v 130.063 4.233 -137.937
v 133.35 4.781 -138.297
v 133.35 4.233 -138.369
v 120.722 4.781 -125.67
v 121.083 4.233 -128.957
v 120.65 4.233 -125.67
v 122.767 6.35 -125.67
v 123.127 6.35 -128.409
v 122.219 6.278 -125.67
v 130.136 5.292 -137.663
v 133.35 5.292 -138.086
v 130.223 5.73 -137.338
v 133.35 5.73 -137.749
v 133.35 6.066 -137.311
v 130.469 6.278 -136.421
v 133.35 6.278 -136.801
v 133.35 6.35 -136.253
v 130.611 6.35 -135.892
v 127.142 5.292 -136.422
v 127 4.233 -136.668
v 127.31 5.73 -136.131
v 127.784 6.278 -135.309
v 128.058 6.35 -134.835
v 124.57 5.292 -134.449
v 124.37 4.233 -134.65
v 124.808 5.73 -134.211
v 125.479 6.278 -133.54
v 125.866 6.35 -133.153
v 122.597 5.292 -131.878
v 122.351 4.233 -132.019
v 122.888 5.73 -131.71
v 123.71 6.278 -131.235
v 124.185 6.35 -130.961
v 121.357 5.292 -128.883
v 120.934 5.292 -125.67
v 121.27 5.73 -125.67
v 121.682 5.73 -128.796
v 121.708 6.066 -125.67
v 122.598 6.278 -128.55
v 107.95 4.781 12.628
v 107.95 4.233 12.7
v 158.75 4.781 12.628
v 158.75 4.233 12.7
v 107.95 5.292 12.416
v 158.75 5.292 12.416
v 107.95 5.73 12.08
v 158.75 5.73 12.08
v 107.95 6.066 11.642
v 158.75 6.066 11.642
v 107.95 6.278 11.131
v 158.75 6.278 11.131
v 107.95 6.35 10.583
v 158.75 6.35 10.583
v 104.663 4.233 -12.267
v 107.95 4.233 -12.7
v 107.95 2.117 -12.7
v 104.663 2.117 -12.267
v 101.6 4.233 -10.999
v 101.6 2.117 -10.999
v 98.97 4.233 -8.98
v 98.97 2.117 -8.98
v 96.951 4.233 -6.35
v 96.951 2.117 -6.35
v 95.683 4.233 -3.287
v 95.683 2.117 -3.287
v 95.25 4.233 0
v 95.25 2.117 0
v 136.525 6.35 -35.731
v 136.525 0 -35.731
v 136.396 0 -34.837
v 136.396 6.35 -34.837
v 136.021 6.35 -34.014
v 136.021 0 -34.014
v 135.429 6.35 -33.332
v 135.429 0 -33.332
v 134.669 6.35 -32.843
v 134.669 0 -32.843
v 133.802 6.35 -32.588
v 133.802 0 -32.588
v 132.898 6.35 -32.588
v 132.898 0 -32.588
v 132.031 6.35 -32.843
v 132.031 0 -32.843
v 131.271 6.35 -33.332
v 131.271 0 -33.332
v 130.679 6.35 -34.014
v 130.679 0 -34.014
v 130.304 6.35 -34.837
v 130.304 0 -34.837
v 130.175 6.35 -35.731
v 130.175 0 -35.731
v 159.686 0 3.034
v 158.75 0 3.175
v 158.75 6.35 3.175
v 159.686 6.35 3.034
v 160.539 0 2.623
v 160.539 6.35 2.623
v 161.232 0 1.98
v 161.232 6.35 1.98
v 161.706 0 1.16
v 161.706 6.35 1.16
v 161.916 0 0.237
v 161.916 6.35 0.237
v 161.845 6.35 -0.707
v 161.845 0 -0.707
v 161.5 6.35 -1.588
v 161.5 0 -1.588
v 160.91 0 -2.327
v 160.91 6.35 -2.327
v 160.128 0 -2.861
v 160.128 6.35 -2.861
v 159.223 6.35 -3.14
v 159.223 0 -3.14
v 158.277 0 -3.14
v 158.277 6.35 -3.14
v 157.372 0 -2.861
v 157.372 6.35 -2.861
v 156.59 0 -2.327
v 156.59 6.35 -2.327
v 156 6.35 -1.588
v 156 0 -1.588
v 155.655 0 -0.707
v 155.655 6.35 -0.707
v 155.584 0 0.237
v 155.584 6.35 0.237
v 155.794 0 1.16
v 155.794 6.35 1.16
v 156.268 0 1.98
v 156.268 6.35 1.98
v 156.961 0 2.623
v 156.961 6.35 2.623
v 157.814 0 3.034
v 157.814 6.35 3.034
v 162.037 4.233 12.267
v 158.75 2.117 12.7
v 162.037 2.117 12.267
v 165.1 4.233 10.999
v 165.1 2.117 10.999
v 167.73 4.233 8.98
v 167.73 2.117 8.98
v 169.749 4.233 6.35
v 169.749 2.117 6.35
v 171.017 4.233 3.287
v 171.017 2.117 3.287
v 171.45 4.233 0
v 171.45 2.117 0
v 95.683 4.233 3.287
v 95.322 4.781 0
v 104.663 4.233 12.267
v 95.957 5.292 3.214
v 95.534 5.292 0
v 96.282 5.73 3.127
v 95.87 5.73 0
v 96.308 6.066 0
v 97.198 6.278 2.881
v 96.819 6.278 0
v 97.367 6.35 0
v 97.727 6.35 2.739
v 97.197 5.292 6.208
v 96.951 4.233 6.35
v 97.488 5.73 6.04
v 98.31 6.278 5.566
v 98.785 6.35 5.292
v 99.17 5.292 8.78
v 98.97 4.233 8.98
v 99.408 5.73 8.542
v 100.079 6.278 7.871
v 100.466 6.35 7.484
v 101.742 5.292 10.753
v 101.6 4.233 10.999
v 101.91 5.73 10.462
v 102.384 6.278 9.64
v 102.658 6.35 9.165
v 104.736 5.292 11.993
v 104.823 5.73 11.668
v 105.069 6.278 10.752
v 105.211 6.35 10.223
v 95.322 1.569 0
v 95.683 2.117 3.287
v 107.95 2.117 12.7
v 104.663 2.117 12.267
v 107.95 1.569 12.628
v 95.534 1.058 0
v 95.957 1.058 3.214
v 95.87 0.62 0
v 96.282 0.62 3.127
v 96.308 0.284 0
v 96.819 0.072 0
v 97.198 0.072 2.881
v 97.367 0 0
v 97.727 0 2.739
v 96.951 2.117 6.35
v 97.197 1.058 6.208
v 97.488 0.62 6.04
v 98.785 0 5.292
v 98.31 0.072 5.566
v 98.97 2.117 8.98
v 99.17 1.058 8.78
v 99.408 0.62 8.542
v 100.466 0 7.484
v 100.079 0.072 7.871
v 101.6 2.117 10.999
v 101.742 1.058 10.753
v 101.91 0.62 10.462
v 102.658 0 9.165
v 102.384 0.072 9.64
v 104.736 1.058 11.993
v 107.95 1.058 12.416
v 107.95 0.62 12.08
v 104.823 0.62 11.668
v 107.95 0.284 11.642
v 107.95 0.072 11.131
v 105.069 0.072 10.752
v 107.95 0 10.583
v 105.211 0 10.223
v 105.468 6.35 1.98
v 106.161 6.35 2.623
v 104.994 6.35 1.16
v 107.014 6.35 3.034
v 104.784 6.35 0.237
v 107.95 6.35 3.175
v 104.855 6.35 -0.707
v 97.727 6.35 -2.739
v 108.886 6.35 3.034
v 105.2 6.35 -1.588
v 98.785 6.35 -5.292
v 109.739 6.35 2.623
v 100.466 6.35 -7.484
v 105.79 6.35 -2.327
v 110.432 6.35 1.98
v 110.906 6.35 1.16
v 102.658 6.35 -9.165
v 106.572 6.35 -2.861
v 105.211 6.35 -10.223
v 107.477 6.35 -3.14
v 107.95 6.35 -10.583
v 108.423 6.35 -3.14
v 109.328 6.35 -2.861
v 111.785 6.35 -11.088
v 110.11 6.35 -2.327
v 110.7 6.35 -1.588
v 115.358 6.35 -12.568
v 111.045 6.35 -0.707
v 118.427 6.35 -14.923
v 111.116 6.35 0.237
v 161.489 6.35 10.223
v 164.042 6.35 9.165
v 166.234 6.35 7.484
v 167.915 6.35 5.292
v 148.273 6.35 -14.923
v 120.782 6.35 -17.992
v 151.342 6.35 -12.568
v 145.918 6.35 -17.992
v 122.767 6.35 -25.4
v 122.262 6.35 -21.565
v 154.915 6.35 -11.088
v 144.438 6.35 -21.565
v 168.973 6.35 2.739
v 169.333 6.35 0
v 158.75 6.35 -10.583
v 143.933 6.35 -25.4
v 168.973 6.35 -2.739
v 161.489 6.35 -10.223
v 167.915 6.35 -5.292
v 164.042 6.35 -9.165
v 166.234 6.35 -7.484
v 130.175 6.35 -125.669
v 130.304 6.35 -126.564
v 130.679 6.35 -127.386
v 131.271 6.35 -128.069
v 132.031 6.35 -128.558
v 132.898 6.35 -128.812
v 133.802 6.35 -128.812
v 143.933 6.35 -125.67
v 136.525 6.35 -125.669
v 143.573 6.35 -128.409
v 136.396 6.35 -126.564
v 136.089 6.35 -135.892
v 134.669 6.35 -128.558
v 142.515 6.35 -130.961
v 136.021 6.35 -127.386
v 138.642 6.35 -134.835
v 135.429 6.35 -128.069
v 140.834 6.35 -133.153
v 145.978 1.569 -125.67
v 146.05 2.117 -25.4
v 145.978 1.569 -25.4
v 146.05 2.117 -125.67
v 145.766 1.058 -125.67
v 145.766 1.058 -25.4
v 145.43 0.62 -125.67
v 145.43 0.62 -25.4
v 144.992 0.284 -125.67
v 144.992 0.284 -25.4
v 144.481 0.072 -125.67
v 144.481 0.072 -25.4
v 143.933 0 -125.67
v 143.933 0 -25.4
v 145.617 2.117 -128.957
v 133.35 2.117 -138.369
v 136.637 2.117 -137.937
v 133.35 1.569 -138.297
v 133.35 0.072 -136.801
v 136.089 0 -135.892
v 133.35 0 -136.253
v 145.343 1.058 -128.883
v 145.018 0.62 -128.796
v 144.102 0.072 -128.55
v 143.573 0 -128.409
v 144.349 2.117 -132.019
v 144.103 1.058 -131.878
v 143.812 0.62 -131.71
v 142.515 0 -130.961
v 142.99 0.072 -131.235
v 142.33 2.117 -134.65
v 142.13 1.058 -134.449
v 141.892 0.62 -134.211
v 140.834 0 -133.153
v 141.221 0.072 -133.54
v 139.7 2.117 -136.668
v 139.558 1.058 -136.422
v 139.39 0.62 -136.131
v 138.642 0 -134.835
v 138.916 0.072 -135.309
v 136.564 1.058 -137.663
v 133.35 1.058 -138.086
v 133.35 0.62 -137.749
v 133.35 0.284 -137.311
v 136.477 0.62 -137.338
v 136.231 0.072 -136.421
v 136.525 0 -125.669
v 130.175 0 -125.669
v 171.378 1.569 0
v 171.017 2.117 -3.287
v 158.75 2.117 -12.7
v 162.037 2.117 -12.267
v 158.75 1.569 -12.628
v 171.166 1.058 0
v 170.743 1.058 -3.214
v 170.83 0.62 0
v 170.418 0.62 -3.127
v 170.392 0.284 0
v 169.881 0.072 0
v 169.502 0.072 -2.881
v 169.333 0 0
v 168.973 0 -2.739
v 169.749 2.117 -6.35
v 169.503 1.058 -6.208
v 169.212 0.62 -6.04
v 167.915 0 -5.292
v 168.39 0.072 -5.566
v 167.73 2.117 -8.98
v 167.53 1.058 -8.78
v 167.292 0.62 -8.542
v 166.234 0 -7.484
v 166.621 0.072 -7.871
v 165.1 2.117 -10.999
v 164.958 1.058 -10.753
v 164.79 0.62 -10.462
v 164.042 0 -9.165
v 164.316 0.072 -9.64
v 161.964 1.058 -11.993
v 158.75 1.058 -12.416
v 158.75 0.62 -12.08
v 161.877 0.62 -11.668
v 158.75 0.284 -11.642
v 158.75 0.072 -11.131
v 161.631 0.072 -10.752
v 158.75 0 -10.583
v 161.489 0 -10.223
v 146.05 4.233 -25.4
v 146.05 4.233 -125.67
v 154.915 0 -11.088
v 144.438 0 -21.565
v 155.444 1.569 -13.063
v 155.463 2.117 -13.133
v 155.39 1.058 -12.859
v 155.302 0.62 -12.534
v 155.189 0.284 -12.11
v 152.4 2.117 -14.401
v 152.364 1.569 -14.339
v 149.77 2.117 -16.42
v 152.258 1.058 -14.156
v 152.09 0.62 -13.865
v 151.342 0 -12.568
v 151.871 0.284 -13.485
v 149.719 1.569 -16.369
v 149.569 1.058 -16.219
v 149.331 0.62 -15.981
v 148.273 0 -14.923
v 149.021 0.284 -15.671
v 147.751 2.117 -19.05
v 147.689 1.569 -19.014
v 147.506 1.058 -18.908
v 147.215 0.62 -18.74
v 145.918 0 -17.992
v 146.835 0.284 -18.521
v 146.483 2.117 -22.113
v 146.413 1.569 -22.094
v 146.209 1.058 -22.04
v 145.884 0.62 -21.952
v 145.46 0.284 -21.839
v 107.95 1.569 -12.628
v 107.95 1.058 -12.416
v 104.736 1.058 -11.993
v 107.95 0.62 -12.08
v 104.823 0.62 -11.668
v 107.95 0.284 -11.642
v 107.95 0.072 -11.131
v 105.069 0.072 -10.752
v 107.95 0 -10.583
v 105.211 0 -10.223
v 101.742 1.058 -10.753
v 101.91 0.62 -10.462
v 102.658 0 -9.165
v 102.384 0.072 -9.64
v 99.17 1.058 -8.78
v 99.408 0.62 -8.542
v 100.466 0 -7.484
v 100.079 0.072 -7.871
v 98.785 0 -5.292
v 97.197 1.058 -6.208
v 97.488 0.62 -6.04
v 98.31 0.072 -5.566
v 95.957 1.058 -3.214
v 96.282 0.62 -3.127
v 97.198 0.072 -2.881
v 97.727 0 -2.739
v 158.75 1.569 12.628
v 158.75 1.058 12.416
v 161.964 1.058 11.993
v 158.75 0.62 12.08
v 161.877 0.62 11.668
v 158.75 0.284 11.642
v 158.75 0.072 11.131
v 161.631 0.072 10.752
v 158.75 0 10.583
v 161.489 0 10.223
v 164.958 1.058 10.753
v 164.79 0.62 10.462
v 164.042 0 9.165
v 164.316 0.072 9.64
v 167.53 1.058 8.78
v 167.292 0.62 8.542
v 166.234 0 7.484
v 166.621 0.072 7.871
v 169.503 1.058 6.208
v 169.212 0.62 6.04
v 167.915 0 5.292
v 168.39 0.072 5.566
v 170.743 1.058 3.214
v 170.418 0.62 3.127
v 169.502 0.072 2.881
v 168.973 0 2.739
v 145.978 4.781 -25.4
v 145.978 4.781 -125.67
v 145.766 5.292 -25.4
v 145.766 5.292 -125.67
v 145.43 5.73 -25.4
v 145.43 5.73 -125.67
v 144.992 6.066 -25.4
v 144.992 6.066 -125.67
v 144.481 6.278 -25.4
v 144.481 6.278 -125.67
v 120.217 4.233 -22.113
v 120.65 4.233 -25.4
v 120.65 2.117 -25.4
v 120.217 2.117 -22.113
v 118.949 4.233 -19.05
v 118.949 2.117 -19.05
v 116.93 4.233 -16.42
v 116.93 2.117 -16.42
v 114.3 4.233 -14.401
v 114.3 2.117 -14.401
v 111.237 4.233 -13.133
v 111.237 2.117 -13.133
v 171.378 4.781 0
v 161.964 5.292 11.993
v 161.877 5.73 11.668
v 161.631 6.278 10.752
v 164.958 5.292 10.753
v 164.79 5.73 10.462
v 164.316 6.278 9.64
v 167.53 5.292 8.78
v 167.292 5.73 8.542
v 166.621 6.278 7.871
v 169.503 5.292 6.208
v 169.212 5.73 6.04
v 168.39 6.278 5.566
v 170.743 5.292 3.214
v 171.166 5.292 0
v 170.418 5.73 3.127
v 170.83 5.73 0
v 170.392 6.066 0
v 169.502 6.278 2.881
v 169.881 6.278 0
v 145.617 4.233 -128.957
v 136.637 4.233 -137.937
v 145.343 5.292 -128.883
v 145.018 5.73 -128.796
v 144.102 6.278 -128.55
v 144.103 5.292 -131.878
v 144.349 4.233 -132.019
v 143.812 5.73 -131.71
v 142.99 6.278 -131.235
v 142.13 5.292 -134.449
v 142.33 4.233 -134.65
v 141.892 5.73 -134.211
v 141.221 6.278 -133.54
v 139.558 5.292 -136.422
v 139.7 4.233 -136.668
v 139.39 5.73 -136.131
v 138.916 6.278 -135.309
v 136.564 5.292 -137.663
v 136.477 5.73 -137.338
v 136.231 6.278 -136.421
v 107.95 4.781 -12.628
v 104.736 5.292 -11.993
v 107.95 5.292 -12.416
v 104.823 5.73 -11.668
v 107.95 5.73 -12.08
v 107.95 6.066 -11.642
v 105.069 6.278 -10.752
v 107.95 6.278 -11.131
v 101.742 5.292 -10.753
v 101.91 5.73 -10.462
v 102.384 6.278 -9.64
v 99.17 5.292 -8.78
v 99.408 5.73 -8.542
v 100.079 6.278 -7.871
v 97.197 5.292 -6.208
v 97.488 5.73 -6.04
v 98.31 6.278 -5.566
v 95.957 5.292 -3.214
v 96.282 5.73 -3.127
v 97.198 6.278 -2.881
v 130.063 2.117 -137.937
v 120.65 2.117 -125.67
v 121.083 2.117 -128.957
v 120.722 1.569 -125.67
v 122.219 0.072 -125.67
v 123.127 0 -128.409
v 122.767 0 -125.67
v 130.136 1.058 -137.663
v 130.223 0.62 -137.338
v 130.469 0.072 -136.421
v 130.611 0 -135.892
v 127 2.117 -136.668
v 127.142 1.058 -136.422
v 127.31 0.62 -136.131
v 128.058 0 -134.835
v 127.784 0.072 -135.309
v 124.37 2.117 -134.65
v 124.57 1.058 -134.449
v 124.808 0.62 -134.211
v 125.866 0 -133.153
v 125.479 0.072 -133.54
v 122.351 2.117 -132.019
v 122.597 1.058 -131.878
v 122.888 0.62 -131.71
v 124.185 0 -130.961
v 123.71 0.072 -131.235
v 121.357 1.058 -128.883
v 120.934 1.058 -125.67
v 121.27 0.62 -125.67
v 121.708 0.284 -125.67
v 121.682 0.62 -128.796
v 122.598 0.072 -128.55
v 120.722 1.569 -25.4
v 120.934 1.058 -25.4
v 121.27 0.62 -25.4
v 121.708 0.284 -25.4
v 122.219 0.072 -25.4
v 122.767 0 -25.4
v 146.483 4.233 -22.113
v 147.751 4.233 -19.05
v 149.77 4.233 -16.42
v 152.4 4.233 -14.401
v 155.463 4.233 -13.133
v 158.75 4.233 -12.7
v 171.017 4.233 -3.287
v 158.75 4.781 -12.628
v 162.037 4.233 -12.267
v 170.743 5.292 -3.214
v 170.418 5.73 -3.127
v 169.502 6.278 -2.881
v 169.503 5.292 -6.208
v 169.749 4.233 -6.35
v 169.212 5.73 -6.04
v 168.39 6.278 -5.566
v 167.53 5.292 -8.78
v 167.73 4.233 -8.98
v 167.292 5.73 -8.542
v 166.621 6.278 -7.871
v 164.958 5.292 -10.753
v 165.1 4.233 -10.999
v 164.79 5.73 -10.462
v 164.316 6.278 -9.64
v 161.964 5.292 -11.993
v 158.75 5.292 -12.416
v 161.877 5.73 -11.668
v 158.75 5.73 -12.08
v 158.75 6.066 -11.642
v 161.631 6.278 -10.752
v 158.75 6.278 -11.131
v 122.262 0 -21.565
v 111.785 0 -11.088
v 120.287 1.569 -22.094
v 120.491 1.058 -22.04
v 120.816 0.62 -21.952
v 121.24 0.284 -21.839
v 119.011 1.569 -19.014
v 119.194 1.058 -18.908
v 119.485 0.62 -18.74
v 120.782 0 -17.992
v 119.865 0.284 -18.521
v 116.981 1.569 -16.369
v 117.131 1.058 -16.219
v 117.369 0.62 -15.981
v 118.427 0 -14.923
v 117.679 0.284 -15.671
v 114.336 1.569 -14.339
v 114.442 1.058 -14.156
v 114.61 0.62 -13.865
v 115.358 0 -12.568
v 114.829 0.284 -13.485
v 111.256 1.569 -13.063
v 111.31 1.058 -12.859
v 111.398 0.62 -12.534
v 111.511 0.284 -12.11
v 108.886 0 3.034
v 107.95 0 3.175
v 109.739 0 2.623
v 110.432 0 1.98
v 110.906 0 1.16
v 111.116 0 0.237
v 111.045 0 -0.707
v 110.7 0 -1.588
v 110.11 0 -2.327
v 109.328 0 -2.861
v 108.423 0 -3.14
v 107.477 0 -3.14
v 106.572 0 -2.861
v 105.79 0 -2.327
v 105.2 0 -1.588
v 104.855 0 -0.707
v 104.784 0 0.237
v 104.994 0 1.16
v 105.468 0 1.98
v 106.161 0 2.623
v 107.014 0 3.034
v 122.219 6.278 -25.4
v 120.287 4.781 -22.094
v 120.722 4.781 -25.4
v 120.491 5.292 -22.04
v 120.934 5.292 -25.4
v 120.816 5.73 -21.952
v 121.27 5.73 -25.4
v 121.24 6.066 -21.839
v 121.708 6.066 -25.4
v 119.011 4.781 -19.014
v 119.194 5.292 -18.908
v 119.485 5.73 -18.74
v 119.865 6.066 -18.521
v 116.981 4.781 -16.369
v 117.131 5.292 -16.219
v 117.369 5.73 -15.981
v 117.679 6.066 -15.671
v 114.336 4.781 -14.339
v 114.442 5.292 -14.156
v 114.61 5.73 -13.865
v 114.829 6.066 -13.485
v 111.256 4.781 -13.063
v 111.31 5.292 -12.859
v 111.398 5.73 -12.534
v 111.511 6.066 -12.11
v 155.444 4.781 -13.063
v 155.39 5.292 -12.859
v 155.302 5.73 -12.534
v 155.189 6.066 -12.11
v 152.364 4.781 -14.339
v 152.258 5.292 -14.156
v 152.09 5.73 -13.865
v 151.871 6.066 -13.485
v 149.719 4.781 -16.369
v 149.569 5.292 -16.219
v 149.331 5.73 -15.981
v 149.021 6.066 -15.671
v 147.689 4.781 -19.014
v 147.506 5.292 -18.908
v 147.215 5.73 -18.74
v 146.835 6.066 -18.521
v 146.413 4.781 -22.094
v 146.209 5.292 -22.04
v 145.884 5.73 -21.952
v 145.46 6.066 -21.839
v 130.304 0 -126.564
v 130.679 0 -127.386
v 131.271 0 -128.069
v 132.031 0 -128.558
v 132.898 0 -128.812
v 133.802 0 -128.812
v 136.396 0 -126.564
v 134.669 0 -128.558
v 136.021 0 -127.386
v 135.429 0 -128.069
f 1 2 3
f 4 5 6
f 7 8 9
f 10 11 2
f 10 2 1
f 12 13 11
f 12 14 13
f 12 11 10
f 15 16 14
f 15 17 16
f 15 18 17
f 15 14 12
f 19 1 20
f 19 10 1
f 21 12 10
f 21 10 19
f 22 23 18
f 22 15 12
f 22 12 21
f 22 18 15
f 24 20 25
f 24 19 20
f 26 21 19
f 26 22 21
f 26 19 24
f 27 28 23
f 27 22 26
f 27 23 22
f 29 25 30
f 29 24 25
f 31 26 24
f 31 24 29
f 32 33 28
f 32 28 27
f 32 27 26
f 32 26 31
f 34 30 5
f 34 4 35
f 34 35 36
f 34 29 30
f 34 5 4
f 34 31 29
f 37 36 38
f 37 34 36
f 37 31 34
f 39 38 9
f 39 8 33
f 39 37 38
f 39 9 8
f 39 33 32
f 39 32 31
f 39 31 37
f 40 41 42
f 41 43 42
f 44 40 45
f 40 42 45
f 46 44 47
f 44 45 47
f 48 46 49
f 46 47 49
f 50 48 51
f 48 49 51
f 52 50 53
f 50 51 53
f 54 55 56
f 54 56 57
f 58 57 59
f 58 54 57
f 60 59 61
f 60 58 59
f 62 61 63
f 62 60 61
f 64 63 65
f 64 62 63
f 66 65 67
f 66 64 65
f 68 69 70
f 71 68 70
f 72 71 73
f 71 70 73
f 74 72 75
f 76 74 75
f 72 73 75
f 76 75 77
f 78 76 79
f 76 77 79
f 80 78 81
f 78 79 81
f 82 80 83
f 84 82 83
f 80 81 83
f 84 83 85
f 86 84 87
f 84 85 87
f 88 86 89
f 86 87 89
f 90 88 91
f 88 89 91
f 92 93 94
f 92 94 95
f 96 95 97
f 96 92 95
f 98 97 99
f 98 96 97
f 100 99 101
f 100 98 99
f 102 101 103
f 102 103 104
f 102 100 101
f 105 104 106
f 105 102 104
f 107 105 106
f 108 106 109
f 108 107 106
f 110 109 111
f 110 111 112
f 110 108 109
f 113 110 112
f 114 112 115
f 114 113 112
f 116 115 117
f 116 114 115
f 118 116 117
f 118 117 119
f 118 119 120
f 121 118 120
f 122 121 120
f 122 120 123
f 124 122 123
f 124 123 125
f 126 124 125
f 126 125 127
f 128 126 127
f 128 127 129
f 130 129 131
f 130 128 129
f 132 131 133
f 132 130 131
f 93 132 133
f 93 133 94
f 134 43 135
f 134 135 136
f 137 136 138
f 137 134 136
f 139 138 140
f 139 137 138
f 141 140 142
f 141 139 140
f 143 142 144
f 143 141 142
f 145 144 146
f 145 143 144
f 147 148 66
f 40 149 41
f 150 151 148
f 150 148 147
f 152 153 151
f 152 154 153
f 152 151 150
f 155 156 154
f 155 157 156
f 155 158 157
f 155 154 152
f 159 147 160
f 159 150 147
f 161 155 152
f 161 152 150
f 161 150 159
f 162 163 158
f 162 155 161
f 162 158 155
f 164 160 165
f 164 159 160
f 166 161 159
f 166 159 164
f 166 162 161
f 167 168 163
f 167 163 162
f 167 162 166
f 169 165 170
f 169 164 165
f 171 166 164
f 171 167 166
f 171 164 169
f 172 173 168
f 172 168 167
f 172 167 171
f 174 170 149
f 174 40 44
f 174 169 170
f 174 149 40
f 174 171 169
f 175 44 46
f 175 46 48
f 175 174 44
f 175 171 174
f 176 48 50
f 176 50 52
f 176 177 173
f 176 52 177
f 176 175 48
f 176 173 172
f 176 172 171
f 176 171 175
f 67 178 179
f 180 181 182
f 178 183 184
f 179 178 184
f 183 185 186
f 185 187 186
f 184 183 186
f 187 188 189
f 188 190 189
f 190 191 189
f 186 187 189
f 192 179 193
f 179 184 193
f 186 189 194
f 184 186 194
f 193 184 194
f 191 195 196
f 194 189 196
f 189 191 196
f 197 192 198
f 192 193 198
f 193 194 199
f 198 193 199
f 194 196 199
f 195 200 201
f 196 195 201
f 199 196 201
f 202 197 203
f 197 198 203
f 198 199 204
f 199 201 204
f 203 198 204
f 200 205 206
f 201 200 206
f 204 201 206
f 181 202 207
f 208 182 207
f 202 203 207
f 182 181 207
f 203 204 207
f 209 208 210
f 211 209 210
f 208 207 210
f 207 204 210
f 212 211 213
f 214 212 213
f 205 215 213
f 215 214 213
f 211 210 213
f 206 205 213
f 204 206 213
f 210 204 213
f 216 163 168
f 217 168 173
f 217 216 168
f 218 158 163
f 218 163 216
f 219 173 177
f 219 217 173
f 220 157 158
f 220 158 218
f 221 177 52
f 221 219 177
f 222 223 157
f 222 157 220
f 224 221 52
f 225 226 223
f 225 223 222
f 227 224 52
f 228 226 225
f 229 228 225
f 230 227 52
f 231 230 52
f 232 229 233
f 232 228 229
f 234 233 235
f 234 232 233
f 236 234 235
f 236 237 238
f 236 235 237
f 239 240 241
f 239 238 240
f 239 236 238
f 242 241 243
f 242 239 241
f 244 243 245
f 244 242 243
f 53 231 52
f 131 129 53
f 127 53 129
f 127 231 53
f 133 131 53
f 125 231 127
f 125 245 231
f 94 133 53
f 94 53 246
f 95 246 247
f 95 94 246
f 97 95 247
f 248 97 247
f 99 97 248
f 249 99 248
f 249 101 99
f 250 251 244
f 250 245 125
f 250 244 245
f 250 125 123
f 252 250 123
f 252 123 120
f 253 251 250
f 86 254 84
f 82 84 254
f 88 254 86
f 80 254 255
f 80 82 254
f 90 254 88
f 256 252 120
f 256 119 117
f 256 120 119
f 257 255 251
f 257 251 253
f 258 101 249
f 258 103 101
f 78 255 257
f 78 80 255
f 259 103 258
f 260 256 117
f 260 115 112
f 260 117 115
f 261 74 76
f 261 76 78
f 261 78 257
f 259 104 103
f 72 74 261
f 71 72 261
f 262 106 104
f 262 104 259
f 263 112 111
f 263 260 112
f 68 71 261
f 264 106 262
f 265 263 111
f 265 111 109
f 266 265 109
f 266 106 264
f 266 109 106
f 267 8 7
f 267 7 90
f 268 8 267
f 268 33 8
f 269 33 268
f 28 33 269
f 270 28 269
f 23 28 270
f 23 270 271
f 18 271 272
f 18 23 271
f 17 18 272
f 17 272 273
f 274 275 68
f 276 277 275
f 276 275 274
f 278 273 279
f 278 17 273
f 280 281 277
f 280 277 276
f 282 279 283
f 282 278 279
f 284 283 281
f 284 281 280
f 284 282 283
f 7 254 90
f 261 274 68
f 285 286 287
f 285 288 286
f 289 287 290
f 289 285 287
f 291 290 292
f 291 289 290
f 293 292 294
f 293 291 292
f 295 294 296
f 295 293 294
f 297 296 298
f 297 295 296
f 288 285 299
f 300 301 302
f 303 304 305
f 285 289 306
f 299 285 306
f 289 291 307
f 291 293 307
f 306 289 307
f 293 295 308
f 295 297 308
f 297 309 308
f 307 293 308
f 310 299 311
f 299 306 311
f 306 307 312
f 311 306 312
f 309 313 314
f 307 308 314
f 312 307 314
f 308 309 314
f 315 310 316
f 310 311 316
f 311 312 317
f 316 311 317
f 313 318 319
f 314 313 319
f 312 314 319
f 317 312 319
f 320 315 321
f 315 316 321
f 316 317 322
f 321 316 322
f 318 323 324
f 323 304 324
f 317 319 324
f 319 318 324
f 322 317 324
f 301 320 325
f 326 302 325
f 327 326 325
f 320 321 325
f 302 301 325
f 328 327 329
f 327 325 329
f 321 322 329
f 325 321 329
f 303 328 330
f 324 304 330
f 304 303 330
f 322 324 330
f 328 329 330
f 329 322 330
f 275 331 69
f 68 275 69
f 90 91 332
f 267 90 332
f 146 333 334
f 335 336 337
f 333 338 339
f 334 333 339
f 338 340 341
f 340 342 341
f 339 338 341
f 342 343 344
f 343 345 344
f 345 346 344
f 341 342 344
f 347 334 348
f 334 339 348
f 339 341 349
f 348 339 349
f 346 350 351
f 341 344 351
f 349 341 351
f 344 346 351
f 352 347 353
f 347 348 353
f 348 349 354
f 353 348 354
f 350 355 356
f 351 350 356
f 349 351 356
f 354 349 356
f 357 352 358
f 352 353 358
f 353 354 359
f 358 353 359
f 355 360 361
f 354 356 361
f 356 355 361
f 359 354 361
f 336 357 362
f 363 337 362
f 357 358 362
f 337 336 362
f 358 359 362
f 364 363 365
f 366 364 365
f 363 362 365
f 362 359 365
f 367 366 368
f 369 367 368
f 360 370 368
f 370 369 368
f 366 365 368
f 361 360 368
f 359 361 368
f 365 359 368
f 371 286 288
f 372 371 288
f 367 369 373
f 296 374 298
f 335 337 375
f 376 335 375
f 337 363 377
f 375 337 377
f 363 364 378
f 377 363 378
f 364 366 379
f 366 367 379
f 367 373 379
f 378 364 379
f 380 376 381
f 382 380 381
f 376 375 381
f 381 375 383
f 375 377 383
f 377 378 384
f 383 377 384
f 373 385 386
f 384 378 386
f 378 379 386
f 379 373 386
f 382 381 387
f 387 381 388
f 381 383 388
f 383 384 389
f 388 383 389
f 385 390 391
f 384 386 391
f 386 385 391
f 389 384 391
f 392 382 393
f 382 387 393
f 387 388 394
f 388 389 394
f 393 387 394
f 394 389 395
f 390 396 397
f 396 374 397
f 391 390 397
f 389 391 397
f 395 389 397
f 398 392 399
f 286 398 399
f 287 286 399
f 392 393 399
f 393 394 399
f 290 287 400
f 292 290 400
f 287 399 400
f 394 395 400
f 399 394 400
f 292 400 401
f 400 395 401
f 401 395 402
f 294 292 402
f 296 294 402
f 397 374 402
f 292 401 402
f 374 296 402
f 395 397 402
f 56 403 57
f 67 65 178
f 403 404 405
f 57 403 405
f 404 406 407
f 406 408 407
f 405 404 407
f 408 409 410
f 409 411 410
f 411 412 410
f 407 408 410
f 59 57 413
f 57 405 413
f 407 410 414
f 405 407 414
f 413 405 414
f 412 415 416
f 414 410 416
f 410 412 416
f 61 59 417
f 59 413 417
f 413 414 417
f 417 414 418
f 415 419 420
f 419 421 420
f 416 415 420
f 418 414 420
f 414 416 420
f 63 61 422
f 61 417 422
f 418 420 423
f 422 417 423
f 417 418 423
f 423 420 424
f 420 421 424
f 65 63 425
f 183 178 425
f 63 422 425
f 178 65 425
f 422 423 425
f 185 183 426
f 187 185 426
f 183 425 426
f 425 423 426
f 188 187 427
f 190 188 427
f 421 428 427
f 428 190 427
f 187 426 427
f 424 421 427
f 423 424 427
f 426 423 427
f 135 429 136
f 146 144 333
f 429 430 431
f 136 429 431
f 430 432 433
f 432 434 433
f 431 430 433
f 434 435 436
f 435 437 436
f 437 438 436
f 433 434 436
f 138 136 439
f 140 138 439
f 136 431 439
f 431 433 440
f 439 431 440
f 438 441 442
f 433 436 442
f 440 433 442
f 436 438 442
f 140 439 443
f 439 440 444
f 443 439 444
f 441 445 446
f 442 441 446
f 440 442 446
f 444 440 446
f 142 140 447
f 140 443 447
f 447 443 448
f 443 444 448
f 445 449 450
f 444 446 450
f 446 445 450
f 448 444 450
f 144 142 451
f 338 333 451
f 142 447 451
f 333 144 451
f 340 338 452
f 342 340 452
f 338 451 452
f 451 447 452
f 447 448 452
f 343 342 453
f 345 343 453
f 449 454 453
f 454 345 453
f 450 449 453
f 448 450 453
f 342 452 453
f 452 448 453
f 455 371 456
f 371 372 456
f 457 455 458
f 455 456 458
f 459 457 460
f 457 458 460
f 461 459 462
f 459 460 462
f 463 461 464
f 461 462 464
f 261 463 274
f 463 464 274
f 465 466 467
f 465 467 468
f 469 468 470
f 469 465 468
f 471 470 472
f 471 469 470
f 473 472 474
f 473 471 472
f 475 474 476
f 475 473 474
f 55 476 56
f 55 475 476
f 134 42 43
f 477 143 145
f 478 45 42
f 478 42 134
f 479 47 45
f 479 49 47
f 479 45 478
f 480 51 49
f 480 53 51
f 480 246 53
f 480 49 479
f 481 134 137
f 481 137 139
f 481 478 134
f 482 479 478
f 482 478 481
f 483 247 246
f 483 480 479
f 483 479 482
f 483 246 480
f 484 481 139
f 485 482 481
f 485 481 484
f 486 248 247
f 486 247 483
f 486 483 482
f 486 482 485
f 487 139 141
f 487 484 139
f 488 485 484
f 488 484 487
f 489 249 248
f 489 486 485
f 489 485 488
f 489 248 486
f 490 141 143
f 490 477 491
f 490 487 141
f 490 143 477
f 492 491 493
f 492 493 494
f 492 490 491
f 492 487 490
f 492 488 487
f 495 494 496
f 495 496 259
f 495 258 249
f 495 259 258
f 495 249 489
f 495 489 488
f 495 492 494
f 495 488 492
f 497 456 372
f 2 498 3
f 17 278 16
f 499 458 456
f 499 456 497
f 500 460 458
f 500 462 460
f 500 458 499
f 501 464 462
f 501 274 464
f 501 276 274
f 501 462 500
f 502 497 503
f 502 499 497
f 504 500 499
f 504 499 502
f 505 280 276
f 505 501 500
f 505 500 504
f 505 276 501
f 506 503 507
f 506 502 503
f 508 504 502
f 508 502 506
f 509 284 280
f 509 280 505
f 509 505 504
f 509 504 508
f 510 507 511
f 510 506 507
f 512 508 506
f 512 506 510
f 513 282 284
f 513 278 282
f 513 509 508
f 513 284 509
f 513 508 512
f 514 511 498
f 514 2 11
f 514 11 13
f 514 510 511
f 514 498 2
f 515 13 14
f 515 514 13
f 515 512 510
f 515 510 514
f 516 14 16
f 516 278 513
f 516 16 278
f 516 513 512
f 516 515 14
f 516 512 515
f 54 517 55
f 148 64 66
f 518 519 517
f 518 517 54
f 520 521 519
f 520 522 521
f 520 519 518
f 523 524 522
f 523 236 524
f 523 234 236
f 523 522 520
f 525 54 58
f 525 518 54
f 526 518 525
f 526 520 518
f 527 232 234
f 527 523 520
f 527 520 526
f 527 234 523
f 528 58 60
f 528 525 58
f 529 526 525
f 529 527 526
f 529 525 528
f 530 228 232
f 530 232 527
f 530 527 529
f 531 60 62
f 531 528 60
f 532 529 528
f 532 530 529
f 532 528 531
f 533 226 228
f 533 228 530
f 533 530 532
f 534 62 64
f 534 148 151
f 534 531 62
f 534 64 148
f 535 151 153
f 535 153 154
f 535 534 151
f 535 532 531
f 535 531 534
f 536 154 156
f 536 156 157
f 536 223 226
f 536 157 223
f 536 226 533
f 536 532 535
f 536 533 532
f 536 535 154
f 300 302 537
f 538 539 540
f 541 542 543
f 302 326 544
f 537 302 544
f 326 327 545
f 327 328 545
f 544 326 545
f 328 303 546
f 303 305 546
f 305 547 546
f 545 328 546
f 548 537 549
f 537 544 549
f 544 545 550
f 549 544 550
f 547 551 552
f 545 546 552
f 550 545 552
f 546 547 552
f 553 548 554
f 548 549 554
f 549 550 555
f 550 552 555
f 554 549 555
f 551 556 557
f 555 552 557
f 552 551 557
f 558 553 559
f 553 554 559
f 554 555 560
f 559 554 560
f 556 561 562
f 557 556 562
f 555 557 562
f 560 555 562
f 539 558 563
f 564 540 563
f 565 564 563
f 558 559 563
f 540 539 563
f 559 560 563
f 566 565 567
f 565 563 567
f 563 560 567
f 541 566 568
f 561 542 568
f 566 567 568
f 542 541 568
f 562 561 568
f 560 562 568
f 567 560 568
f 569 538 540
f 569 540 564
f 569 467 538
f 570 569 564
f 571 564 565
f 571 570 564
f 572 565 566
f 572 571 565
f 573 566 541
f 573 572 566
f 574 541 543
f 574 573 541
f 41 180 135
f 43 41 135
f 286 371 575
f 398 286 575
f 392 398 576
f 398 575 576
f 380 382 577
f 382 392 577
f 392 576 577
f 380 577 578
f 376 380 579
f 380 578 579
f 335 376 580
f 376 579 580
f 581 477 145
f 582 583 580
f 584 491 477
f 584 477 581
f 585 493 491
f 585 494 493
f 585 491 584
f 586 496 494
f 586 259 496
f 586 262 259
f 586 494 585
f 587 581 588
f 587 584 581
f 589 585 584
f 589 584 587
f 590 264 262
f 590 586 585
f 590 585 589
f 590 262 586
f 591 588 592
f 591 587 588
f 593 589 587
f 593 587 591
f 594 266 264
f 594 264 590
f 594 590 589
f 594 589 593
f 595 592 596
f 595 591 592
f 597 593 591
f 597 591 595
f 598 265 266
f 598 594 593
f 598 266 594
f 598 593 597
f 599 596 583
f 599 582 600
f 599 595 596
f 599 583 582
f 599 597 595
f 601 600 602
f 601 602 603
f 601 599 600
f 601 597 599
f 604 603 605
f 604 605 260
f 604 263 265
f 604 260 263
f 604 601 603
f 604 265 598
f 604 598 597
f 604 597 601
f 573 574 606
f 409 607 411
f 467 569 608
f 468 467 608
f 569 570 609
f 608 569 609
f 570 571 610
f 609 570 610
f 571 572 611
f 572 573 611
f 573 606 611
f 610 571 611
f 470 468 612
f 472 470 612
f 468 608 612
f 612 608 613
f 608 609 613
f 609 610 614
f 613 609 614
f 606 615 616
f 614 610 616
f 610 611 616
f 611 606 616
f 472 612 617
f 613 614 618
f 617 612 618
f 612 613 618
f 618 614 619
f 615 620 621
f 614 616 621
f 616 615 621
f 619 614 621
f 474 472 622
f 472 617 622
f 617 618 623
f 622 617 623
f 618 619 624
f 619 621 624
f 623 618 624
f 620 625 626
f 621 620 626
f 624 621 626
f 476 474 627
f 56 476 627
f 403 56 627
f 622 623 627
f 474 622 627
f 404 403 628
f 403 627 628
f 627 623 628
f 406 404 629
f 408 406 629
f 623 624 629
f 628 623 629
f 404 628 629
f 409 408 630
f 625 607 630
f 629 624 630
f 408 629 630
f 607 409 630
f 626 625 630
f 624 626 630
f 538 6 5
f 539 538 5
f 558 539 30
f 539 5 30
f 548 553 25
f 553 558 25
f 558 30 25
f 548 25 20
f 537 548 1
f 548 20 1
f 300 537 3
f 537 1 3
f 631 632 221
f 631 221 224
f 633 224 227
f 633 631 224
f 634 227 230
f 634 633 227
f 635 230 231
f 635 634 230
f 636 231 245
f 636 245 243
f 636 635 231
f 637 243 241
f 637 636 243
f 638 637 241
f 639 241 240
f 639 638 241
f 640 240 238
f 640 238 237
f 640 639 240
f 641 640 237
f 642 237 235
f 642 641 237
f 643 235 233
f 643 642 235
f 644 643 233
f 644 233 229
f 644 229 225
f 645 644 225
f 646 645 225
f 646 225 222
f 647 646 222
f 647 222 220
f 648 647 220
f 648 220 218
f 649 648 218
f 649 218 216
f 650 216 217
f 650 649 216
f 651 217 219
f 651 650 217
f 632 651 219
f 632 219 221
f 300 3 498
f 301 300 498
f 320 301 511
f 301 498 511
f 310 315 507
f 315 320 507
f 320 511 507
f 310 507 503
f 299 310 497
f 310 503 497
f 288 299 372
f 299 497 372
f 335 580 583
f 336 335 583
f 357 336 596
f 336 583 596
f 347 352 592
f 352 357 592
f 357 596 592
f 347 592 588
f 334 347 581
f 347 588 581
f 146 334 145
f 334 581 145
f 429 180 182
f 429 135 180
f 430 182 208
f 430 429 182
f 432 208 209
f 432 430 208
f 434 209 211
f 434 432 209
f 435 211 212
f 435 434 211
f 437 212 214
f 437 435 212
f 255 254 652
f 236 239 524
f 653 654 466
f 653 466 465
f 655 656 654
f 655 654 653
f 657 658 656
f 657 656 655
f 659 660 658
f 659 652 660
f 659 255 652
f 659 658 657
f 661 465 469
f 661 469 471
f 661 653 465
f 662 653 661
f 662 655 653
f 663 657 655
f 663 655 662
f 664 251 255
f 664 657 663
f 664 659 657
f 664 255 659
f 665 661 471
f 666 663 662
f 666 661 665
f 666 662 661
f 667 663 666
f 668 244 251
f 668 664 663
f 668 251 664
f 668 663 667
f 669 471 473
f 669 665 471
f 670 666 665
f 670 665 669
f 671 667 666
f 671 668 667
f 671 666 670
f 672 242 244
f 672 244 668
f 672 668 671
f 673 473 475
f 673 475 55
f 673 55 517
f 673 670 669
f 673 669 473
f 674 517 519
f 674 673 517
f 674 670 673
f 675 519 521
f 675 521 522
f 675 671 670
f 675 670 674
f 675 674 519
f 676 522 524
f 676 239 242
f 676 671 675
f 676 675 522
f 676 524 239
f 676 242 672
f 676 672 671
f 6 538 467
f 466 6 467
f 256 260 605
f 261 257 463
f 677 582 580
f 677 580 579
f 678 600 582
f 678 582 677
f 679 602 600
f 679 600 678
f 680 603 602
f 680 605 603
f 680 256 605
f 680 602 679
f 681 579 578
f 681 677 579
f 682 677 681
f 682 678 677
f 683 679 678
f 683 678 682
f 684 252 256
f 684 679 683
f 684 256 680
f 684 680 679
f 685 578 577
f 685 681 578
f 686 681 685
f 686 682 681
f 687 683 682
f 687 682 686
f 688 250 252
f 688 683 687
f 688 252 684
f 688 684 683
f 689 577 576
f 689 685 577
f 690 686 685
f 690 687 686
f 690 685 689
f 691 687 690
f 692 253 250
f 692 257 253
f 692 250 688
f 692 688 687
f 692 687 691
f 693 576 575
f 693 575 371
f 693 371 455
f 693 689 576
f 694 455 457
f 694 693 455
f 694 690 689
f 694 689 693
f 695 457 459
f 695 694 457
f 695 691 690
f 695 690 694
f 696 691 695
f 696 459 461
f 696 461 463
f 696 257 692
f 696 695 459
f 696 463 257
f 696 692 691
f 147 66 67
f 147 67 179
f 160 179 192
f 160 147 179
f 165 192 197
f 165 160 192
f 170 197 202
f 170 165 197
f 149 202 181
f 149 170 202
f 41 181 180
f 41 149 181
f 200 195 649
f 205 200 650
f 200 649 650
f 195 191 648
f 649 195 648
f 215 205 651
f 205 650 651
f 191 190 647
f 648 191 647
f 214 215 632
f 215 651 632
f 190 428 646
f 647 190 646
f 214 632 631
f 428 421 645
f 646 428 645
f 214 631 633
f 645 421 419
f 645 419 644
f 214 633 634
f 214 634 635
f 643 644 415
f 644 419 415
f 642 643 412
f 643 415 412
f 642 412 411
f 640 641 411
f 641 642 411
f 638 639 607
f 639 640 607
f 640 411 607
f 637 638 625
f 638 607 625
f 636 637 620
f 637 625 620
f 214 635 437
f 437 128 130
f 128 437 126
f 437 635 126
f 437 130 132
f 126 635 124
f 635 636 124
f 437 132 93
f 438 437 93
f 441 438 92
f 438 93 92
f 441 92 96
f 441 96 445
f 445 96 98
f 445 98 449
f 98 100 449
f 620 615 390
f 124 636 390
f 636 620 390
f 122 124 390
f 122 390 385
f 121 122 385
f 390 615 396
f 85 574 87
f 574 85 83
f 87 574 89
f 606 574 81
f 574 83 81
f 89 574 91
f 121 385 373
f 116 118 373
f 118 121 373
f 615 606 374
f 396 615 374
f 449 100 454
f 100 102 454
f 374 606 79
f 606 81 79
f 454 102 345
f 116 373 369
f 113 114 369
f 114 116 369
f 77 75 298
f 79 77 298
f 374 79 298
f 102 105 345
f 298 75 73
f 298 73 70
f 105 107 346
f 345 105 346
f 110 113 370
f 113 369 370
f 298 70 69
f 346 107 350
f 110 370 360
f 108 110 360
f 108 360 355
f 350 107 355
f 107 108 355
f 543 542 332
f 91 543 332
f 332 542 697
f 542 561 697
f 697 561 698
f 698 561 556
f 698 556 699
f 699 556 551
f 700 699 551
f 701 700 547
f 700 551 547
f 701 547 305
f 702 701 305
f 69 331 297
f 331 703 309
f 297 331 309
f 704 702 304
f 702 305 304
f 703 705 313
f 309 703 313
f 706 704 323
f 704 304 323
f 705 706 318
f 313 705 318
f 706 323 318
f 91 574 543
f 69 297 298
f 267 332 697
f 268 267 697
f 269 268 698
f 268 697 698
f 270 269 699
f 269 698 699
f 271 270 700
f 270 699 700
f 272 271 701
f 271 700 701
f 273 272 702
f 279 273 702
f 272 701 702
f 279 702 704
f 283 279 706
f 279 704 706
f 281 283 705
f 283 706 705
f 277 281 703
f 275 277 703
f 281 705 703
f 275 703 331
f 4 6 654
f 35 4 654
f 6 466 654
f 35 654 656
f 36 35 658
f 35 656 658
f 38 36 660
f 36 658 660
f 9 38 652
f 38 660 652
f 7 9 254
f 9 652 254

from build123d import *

# Parameters (mm, degrees)
SKETCH1_R           = 3.175
BOSS_EXTRUDE1_DEPTH = 6.35
FILLET2_R           = 12.7
FILLET3_R           = 2.116666667


with BuildPart() as part:
    # Sketch1 → Boss-Extrude1 (new body)
    with BuildSketch(Plane(origin=(0, 0, 0), x_dir=(1, 0, 0), z_dir=(0, 1, 0))):
        Polygon((120.65, 138.369431979), (120.65, 12.7), (95.25, 12.7), (95.25, -12.7), (120.65, -12.7), (146.05, -12.7), (171.45, -12.7), (171.45, 12.7), (146.05, 12.7), (146.05, 138.369431979), align=None)
        with Locations(Location((107.95, 0, 0), (0, 0, 270))):
            Circle(SKETCH1_R, mode=Mode.SUBTRACT)
        with Locations(Location((158.75, 0, 0), (0, 0, 270))):
            Circle(SKETCH1_R, mode=Mode.SUBTRACT)
        with BuildLine():
            Line((130.175, 35.731024811), (130.175, 125.669431979))
            ThreePointArc((130.175, 125.669431979), (133.35, 128.844431979), (136.525, 125.669431979))
            Line((136.525, 125.669431979), (136.525, 35.731024811))
            ThreePointArc((136.525, 35.731024811), (133.35, 32.556024811), (130.175, 35.731024811))
        make_face(mode=Mode.SUBTRACT)
    extrude(amount=BOSS_EXTRUDE1_DEPTH)

    # Fillet2
    fillet2_edges = [part.edges().sort_by_distance(p)[0] for p in [
        (120.65, 3.175, -138.369431979),
        (146.05, 3.175, -138.369431979),
        (146.05, 3.175, -12.7),
        (171.45, 3.175, 12.7),
        (171.45, 3.175, -12.7),
        (95.25, 3.175, 12.7),
        (95.25, 3.175, -12.7),
        (120.65, 3.175, -12.7),
    ]]
    fillet(fillet2_edges, radius=FILLET2_R - 0.0001)  # a hair under: the kernel refuses the full size

    # Fillet3
    fillet3_edges = [part.edges().sort_by_distance(p)[0] for p in [
        (120.65, 0, -75.53471599),
        (120.65, 6.35, -75.53471599),
        (133.35, 0, 12.7),
        (146.05, 0, -75.53471599),
        (98.96971459, 0, -8.98028541),
        (98.96971459, 0, 8.98028541),
        (167.73028541, 0, -8.98028541),
        (167.73028541, 0, 8.98028541),
        (142.33028541, 0, -134.64971739),
        (124.36971459, 0, -134.64971739),
        (146.05, 6.35, -75.53471599),
        (133.35, 6.35, 12.7),
        (98.96971459, 6.35, -8.98028541),
        (98.96971459, 6.35, 8.98028541),
        (167.73028541, 6.35, -8.98028541),
        (167.73028541, 6.35, 8.98028541),
        (142.33028541, 6.35, -134.64971739),
        (124.36971459, 6.35, -134.64971739),
        (149.76971459, 0, -16.41971459),
        (149.76971459, 6.35, -16.41971459),
        (116.93028541, 0, -16.41971459),
        (116.93028541, 6.35, -16.41971459),
    ]]
    fillet(fillet3_edges, radius=FILLET3_R)


solid = part.part
